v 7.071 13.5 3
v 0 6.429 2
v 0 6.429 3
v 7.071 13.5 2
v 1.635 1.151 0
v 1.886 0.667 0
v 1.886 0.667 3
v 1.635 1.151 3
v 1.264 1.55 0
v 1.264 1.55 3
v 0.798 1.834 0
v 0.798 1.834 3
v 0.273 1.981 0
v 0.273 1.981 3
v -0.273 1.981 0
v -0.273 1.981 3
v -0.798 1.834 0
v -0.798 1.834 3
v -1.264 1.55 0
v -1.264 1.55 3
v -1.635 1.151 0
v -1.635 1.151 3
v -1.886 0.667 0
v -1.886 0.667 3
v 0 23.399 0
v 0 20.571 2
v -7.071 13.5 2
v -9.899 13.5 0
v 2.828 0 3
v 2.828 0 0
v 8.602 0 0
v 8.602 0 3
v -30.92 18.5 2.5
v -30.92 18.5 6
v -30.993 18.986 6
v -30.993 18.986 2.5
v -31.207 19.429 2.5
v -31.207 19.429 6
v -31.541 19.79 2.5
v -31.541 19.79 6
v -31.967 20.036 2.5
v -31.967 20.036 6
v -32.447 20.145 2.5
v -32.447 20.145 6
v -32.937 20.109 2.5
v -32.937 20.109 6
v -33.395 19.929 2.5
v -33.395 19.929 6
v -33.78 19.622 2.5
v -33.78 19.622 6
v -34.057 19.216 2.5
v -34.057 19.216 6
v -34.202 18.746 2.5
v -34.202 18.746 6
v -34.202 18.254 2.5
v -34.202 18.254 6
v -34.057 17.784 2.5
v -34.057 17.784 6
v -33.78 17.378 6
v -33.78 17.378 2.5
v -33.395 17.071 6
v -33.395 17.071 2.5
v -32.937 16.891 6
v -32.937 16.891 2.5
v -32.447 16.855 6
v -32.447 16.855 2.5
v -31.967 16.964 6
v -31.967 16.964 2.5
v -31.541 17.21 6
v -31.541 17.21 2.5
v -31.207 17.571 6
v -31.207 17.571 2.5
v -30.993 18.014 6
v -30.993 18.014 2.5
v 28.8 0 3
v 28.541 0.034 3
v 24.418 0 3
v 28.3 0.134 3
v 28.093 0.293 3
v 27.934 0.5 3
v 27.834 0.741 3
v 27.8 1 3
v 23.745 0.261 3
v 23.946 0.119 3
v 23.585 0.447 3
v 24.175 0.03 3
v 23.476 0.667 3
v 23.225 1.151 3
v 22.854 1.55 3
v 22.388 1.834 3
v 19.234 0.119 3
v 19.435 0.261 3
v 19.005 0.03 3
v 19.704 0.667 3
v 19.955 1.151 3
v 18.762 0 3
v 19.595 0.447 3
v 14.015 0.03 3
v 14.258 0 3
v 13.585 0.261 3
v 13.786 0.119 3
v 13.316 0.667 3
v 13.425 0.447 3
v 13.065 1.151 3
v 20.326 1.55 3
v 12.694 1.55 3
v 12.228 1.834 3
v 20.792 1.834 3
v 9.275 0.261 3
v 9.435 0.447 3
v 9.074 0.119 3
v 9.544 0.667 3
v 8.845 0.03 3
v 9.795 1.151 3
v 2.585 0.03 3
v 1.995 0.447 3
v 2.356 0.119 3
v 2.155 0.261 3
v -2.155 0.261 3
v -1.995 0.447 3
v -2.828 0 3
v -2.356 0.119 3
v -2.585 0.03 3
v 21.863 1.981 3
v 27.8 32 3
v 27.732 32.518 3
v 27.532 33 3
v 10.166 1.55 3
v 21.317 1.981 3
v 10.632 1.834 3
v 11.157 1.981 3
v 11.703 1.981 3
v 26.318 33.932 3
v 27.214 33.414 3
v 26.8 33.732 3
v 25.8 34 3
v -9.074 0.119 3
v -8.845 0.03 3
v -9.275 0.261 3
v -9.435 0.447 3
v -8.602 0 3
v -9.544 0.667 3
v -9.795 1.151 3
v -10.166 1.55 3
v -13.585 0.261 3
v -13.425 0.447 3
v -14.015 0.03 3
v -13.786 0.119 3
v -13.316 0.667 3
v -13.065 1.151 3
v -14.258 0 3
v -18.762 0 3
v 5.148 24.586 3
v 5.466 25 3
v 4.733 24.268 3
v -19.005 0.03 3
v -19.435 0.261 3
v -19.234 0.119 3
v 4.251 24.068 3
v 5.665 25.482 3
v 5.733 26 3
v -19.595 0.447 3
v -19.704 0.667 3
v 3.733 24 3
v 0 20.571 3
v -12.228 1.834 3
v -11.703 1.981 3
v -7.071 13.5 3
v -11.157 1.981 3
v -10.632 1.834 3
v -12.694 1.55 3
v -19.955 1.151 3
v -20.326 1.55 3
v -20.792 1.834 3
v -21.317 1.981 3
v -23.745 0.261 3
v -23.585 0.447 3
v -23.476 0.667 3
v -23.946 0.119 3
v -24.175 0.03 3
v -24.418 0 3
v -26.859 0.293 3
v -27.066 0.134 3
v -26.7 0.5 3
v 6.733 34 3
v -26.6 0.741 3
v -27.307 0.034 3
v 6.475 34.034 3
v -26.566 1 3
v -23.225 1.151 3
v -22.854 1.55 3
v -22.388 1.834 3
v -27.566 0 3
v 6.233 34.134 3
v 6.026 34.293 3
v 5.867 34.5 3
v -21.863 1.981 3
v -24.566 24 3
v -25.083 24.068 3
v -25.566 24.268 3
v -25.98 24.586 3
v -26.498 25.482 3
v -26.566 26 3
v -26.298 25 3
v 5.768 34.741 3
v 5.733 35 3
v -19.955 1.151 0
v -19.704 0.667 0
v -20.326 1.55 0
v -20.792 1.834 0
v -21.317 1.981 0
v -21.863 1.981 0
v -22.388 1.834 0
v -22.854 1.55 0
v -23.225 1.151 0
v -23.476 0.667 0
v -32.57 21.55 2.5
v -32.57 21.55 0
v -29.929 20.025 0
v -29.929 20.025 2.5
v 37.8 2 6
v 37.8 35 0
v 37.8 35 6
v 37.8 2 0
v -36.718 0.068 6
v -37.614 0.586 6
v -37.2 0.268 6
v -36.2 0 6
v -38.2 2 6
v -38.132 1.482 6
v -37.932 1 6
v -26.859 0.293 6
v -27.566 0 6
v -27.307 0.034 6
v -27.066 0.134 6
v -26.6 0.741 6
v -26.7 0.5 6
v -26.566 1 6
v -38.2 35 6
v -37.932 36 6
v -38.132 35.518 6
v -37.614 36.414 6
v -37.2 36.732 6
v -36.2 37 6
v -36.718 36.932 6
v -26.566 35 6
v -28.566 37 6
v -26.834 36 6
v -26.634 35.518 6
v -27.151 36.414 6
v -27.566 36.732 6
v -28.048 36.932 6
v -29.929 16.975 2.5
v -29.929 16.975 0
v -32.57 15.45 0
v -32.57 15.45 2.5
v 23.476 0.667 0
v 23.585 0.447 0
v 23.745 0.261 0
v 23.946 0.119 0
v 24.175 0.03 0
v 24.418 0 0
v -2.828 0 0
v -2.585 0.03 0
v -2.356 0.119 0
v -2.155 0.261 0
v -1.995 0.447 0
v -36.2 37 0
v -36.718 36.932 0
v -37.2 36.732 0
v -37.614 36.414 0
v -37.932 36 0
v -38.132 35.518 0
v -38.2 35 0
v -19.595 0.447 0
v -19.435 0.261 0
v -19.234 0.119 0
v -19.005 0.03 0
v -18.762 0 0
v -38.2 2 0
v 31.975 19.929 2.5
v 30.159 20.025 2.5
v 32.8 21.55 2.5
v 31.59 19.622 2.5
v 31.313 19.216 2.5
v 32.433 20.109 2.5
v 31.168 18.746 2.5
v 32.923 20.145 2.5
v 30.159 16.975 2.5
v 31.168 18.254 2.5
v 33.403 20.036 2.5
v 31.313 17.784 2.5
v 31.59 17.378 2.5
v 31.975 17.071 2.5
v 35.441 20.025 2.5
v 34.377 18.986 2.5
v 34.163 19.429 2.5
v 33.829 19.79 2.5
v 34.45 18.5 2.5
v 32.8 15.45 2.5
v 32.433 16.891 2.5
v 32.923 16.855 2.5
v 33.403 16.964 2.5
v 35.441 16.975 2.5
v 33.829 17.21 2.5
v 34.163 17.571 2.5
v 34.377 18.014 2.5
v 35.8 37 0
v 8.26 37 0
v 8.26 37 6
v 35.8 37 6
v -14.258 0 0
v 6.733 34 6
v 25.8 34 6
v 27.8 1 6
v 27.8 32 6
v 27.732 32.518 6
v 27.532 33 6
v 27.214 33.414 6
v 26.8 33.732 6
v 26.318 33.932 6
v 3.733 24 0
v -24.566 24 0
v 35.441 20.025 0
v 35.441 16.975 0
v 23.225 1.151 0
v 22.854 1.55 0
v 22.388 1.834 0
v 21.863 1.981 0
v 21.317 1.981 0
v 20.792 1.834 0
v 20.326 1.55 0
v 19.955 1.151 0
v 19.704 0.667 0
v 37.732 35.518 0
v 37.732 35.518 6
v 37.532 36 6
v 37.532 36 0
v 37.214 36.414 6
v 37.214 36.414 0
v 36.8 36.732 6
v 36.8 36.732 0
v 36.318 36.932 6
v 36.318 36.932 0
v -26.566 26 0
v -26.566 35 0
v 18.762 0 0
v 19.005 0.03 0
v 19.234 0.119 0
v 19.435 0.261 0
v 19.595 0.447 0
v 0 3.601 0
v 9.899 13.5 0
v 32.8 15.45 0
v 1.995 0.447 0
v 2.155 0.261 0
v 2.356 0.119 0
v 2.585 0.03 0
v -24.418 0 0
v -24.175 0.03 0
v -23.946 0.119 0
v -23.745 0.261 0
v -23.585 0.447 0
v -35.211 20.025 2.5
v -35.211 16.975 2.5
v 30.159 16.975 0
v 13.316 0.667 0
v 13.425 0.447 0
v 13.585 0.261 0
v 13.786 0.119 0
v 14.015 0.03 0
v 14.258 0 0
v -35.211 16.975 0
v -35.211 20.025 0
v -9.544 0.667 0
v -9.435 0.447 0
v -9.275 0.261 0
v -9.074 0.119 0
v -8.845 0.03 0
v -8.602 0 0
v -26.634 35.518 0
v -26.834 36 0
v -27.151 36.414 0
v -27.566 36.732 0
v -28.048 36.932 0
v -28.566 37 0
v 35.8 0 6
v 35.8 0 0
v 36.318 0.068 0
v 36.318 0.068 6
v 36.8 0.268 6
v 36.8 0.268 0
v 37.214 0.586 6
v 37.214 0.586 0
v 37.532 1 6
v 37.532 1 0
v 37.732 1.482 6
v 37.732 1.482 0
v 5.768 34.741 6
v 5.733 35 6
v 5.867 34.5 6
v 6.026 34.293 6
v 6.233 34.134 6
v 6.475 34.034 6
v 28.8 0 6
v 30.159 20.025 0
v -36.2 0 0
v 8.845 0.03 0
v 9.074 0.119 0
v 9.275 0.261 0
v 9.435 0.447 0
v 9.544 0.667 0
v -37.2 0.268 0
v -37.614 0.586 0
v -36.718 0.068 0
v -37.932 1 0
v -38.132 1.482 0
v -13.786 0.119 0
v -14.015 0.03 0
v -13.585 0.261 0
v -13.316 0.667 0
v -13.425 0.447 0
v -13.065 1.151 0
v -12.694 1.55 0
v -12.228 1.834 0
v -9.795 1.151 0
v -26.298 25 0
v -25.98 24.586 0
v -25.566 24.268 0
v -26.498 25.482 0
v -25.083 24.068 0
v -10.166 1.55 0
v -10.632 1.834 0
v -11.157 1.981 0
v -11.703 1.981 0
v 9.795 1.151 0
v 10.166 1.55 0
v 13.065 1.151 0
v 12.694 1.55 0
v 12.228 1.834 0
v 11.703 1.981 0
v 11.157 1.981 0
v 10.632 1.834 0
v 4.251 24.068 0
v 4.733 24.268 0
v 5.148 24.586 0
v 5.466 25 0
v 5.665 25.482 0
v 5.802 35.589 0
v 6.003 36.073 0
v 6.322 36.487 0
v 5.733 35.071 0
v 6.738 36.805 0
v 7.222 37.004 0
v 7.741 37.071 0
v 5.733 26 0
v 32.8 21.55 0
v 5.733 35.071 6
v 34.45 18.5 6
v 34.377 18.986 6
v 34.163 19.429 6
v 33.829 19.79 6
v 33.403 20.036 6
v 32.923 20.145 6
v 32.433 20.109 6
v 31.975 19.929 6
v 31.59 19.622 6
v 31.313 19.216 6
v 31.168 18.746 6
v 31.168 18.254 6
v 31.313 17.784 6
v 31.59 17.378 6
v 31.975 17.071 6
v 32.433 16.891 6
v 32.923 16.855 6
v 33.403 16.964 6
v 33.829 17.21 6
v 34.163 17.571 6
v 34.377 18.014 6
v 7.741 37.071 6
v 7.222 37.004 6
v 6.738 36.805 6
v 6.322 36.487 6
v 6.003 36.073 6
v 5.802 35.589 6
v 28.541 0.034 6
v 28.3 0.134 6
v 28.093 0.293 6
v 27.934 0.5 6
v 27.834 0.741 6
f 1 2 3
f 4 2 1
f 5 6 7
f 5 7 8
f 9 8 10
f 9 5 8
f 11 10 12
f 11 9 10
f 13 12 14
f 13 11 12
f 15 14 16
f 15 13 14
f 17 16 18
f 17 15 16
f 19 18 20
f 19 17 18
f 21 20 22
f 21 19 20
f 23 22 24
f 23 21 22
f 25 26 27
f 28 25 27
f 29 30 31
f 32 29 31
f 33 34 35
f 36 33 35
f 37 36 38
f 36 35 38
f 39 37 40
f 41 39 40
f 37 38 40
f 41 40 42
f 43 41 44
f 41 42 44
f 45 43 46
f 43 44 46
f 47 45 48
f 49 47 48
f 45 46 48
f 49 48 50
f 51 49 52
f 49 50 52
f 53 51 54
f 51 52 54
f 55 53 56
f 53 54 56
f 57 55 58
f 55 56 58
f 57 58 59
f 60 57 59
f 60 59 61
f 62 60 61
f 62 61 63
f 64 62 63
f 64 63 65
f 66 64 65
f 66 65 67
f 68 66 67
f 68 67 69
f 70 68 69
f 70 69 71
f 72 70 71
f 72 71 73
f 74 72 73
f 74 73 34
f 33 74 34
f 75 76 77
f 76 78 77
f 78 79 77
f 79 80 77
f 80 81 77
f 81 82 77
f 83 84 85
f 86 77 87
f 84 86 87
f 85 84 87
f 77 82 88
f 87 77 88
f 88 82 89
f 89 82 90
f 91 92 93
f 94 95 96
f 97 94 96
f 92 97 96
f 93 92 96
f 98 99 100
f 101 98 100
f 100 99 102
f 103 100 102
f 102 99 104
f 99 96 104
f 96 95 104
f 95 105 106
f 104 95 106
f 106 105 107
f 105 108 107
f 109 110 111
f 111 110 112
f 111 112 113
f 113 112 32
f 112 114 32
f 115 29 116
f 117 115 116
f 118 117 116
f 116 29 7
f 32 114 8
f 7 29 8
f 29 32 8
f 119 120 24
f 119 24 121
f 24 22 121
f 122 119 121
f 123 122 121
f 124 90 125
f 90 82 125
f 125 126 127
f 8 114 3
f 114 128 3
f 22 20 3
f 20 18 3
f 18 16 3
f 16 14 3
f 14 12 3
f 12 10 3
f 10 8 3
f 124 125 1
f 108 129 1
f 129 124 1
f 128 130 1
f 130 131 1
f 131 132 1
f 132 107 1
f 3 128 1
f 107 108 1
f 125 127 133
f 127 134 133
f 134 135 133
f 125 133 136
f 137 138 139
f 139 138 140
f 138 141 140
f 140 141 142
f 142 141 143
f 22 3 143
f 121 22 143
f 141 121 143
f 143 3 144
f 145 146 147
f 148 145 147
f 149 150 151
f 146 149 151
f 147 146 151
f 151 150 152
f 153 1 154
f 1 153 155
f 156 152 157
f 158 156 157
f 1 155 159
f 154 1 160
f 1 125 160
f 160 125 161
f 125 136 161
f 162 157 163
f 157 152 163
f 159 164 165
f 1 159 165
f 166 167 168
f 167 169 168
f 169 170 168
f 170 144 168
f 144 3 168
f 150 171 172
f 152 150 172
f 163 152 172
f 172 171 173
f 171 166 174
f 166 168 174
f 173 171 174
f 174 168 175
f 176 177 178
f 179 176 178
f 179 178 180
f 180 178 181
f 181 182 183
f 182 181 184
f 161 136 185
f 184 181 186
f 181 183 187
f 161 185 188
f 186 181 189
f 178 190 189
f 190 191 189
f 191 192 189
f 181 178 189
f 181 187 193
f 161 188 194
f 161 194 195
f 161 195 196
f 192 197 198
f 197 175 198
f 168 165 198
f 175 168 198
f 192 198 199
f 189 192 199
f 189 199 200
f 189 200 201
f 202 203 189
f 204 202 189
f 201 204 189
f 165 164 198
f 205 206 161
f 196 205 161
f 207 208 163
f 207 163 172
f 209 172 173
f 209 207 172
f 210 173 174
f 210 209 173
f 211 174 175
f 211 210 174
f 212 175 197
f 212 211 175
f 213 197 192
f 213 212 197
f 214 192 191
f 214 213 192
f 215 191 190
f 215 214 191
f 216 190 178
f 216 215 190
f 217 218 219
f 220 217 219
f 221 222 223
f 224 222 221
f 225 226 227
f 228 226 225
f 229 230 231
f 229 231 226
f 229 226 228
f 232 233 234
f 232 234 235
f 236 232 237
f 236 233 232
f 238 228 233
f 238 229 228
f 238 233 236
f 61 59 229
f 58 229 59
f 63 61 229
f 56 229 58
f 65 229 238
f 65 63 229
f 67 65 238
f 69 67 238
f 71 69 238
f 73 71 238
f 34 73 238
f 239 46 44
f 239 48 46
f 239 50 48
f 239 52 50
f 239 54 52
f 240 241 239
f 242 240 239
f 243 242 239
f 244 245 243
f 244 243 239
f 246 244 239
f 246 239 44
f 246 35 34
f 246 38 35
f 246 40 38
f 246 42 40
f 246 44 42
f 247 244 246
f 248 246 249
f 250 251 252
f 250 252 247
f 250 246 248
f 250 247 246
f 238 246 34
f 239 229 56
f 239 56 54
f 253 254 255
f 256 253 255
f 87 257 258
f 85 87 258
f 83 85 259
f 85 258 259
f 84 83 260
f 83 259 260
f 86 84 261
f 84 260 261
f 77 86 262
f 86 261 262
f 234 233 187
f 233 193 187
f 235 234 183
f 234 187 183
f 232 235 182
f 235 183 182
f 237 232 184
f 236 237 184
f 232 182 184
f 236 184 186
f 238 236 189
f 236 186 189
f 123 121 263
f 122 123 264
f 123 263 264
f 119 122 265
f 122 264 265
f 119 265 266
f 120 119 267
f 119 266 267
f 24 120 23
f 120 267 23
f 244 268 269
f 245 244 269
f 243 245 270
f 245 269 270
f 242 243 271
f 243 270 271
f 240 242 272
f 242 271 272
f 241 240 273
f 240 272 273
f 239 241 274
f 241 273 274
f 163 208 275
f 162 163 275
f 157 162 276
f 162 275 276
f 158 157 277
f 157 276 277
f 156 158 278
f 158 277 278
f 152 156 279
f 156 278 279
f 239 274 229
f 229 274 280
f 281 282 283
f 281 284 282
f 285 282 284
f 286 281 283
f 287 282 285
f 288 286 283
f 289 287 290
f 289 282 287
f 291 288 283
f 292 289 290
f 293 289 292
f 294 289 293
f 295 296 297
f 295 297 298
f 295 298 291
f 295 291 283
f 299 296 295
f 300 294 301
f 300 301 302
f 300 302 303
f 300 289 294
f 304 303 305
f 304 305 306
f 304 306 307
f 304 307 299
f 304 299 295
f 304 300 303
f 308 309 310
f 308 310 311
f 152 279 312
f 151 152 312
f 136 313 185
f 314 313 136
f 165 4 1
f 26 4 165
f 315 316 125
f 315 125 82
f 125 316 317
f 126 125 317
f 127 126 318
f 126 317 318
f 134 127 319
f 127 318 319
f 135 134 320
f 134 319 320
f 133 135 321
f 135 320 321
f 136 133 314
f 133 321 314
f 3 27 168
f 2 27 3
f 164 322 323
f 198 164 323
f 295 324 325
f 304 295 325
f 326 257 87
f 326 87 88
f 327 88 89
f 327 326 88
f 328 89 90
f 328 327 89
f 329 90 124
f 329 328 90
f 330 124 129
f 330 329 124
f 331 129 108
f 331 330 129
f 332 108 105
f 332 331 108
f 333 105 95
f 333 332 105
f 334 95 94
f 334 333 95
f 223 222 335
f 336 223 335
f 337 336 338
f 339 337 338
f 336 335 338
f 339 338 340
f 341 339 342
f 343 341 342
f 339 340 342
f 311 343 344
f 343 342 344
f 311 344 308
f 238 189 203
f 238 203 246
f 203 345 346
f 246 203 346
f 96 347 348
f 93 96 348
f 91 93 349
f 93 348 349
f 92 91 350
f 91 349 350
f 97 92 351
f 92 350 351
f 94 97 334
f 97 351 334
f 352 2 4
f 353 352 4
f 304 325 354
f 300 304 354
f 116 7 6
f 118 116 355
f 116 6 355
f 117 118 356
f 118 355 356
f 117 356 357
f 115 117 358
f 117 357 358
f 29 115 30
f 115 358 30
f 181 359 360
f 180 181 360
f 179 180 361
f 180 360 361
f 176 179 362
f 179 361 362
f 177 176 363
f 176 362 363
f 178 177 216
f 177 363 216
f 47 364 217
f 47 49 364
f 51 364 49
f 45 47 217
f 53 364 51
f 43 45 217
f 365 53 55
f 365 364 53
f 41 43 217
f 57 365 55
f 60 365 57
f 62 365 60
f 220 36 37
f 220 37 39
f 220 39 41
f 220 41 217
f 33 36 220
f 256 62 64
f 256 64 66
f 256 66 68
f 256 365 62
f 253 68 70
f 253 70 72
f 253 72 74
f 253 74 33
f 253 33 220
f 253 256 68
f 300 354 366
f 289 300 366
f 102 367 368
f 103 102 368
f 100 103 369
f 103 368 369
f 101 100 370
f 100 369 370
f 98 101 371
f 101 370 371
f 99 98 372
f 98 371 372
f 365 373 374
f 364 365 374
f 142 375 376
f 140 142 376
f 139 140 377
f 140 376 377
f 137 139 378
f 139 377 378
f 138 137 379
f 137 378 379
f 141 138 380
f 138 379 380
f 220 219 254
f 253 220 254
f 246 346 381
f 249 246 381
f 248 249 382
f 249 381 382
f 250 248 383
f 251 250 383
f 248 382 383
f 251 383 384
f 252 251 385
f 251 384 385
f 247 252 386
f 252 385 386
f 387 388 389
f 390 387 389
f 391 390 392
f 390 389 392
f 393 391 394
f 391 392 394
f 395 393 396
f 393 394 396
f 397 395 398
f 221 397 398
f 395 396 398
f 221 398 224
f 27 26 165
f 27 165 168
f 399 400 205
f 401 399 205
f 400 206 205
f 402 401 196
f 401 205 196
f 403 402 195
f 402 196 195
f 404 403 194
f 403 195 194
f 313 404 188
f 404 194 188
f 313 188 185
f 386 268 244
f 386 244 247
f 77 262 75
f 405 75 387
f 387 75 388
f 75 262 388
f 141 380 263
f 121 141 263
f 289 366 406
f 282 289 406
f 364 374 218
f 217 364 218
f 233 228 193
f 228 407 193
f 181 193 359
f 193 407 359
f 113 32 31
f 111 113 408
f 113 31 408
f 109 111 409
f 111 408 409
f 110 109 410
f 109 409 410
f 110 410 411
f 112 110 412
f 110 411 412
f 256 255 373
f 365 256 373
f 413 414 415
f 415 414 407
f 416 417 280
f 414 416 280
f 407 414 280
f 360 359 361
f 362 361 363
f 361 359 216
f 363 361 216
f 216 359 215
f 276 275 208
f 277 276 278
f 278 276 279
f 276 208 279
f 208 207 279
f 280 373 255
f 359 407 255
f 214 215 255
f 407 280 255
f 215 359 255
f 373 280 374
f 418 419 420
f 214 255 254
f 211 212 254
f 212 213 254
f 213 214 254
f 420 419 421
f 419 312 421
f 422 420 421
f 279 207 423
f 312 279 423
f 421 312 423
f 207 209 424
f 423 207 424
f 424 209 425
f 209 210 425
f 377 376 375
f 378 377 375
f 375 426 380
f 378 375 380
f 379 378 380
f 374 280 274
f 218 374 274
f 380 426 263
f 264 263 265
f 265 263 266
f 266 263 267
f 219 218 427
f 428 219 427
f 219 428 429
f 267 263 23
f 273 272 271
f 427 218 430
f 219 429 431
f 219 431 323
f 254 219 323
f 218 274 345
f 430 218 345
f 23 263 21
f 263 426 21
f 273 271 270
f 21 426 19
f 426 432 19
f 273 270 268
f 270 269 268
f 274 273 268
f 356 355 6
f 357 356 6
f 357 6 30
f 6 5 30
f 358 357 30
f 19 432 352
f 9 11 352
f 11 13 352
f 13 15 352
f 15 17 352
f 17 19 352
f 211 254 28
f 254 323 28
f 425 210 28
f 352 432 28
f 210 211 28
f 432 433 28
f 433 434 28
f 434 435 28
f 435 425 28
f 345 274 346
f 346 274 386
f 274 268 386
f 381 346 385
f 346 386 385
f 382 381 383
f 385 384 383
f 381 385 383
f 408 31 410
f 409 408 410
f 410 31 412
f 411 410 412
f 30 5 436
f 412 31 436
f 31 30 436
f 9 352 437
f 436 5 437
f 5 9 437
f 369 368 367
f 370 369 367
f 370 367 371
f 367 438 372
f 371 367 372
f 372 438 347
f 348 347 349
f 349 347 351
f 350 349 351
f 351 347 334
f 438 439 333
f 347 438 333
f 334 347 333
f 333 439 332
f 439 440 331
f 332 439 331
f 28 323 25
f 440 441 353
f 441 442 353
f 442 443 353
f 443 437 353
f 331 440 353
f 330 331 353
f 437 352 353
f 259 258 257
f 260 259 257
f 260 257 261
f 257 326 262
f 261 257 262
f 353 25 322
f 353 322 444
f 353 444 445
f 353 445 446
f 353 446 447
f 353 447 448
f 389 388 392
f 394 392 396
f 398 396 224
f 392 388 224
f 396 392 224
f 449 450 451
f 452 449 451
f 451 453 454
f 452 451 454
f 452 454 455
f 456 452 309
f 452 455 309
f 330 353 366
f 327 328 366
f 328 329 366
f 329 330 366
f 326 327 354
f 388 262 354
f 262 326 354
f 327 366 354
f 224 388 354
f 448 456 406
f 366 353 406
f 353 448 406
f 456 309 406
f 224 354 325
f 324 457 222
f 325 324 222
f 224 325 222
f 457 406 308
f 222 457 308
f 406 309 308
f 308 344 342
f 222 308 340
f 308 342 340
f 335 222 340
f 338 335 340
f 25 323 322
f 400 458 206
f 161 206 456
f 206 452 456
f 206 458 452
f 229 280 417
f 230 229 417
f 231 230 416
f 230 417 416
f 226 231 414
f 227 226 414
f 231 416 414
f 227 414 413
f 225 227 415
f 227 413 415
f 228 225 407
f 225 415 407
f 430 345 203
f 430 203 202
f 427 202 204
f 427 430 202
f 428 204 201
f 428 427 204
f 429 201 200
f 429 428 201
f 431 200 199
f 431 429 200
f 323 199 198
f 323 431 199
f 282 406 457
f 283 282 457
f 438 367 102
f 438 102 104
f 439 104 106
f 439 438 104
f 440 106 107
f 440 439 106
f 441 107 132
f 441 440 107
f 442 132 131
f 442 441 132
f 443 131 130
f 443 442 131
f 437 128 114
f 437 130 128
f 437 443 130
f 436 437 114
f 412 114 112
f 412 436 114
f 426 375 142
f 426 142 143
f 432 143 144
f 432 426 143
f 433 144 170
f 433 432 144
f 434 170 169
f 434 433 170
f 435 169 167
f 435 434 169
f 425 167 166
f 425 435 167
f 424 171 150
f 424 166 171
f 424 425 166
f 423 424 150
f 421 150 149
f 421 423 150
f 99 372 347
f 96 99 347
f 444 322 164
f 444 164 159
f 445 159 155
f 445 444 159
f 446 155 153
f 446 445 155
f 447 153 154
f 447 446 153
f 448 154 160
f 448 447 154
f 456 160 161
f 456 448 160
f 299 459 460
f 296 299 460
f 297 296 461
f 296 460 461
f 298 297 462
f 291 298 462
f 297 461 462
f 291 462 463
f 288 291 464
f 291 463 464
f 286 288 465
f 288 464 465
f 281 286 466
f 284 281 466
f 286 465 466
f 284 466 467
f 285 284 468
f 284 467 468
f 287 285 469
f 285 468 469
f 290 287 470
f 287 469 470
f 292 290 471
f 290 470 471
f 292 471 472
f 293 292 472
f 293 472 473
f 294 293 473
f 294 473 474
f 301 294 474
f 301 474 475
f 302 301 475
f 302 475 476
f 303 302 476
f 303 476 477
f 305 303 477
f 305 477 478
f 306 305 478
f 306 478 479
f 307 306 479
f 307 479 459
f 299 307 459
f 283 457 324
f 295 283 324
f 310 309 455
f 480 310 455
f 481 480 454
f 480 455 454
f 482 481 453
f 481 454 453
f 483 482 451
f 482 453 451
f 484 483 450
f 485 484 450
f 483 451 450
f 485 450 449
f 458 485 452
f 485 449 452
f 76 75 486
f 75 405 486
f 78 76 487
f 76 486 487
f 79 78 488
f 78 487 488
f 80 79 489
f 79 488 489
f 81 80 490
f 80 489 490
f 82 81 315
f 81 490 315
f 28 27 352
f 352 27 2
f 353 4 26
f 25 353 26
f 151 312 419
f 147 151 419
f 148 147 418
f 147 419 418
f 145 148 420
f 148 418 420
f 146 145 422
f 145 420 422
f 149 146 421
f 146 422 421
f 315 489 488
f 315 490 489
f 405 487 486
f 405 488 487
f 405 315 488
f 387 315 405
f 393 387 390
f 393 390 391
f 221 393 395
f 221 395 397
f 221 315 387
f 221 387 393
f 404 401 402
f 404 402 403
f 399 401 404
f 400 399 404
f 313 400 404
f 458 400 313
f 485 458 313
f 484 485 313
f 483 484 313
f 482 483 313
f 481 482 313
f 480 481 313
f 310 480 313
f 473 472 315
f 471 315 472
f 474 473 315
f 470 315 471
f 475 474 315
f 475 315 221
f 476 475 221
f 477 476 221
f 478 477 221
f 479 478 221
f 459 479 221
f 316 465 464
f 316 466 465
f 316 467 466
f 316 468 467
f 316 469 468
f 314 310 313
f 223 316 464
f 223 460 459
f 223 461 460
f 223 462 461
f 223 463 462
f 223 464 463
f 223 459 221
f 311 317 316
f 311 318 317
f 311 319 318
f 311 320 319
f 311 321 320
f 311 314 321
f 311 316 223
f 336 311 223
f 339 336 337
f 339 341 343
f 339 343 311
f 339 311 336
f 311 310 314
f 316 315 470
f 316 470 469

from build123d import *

# Parameters (mm, degrees)
PAD_DEPTH       = 6
POCKET_DEPTH    = 3
FILLET_R        = 1
CHAMFER_SIZE    = 2
SKETCH002_R     = 1.65
POCKET001_DEPTH = 6.001
POCKET002_DEPTH = 2.5


with BuildPart() as part:
    # Sketch → Pad (new body)
    with BuildSketch(Plane.XY):
        with BuildLine():
            Line((5.733466, 35.070521), (5.733466, 26))
            ThreePointArc((3.733466, 24), (5.14768, 24.585786), (5.733466, 26))
            Line((3.733466, 24), (-24.565653, 24))
            ThreePointArc((-26.565653, 26), (-25.979867, 24.585786), (-24.565653, 24))
            Line((-26.565653, 26), (-26.565653, 35))
            ThreePointArc((-26.565653, 35), (-27.15144, 36.414214), (-28.565653, 37))
            Line((-36.2, 37), (-28.565653, 37))
            ThreePointArc((-36.2, 37), (-37.614214, 36.414214), (-38.2, 35))
            Line((-38.2, 35), (-38.2, 2))
            ThreePointArc((-38.2, 2), (-37.614214, 0.585786), (-36.2, 0))
            Line((-25.8, 0), (-36.2, 0))
            Line((-25.8, 0), (-24.418427, 0))
            ThreePointArc((-24.418427, 0), (-23.841077, 0.183503), (-23.475618, 0.666667))
            ThreePointArc((-19.704382, 0.666667), (-21.59, 2), (-23.475618, 0.666667))
            ThreePointArc((-19.704382, 0.666667), (-19.338923, 0.183503), (-18.761573, 0))
            Line((-18.761573, 0), (-14.258427, 0))
            ThreePointArc((-14.258427, 0), (-13.681077, 0.183503), (-13.315618, 0.666667))
            ThreePointArc((-9.544382, 0.666667), (-11.43, 2), (-13.315618, 0.666667))
            ThreePointArc((-9.544382, 0.666667), (-9.178923, 0.183503), (-8.601573, 0))
            Line((-8.601573, 0), (-2.828427, 0))
            ThreePointArc((-2.828427, 0), (-2.251077, 0.183503), (-1.885618, 0.666667))
            ThreePointArc((1.885618, 0.666667), (0, 2), (-1.885618, 0.666667))
            ThreePointArc((1.885618, 0.666667), (2.251077, 0.183503), (2.828427, 0))
            Line((2.828427, 0), (8.601573, 0))
            ThreePointArc((8.601573, 0), (9.178923, 0.183503), (9.544382, 0.666667))
            ThreePointArc((13.315618, 0.666667), (11.43, 2), (9.544382, 0.666667))
            ThreePointArc((13.315618, 0.666667), (13.681077, 0.183503), (14.258427, 0))
            Line((14.258427, 0), (18.761573, 0))
            ThreePointArc((18.761573, 0), (19.338923, 0.183503), (19.704382, 0.666667))
            ThreePointArc((23.475618, 0.666667), (21.59, 2), (19.704382, 0.666667))
            ThreePointArc((23.475618, 0.666667), (23.841077, 0.183503), (24.418427, 0))
            Line((24.418427, 0), (25.8, 0))
            Line((25.8, 0), (35.8, 0))
            ThreePointArc((35.8, 0), (37.214214, 0.585786), (37.8, 2))
            Line((37.8, 35), (37.8, 2))
            ThreePointArc((37.8, 35), (37.214214, 36.414214), (35.8, 37))
            Line((8.25988, 37), (35.8, 37))
            ThreePointArc((8.25988, 37), (6.519553, 36.659991), (5.733466, 35.070521))
        make_face()
        Polygon((7.071068, 13.5), (0, 20.571068), (-7.071068, 13.5), (0, 6.428932), align=None, mode=Mode.SUBTRACT)
    extrude(amount=PAD_DEPTH)

    # Sketch001 (on Face40 of Pad) → Pocket (cut)
    with BuildSketch(Plane.XY.offset(6)):
        with BuildLine():
            Line((-26.565653, 34), (25.8, 34))
            ThreePointArc((27.8, 32), (27.214214, 33.414214), (25.8, 34))
            Line((27.8, 32), (27.8, -3.158395))
            Line((27.8, -3.158395), (-26.565653, -3.158395))
            Line((-26.565653, -3.158395), (-26.565653, 34))
        make_face()
    extrude(amount=-POCKET_DEPTH, mode=Mode.SUBTRACT)

    # Fillet
    fillet_edges = [part.edges().sort_by_distance(p)[0] for p in [
        (-26.565653, 0, 4.5),
        (27.8, 0, 4.5),
        (5.733466, 34, 4.5),
    ]]
    fillet(fillet_edges, radius=FILLET_R)

    # Chamfer
    chamfer_edges = [part.edges().sort_by_distance(p)[0] for p in [
        (3.535534, 9.964466, 0),
        (3.535534, 17.035534, 0),
        (-3.535534, 17.035534, 0),
        (-3.535534, 9.964466, 0),
    ]]
    chamfer(chamfer_edges, length=CHAMFER_SIZE)

    # Sketch002 (on Face49 of Chamfer) → Pocket001 (cut, through all)
    with BuildSketch(Plane.XY.offset(6)):
        with Locations((-32.57, 18.5)):
            Circle(SKETCH002_R)
        with Locations((32.8, 18.5)):
            Circle(SKETCH002_R)
    extrude(amount=-POCKET001_DEPTH, mode=Mode.SUBTRACT)

    # Sketch003 (on Face1 of Pocket001) → Pocket002 (cut)
    with BuildSketch(Plane(origin=(0, 0, 0), x_dir=(1, 0, 0), z_dir=(0, 0, -1))):
        Polygon((-29.928623, -20.025), (-29.928623, -16.975), (-32.57, -15.45), (-35.211377, -16.975), (-35.211377, -20.025), (-32.57, -21.55), align=None)
        Polygon((35.441377, -20.025), (35.441377, -16.975), (32.8, -15.45), (30.158623, -16.975), (30.158623, -20.025), (32.8, -21.55), align=None)
    extrude(amount=-POCKET002_DEPTH, mode=Mode.SUBTRACT)


solid = part.part
